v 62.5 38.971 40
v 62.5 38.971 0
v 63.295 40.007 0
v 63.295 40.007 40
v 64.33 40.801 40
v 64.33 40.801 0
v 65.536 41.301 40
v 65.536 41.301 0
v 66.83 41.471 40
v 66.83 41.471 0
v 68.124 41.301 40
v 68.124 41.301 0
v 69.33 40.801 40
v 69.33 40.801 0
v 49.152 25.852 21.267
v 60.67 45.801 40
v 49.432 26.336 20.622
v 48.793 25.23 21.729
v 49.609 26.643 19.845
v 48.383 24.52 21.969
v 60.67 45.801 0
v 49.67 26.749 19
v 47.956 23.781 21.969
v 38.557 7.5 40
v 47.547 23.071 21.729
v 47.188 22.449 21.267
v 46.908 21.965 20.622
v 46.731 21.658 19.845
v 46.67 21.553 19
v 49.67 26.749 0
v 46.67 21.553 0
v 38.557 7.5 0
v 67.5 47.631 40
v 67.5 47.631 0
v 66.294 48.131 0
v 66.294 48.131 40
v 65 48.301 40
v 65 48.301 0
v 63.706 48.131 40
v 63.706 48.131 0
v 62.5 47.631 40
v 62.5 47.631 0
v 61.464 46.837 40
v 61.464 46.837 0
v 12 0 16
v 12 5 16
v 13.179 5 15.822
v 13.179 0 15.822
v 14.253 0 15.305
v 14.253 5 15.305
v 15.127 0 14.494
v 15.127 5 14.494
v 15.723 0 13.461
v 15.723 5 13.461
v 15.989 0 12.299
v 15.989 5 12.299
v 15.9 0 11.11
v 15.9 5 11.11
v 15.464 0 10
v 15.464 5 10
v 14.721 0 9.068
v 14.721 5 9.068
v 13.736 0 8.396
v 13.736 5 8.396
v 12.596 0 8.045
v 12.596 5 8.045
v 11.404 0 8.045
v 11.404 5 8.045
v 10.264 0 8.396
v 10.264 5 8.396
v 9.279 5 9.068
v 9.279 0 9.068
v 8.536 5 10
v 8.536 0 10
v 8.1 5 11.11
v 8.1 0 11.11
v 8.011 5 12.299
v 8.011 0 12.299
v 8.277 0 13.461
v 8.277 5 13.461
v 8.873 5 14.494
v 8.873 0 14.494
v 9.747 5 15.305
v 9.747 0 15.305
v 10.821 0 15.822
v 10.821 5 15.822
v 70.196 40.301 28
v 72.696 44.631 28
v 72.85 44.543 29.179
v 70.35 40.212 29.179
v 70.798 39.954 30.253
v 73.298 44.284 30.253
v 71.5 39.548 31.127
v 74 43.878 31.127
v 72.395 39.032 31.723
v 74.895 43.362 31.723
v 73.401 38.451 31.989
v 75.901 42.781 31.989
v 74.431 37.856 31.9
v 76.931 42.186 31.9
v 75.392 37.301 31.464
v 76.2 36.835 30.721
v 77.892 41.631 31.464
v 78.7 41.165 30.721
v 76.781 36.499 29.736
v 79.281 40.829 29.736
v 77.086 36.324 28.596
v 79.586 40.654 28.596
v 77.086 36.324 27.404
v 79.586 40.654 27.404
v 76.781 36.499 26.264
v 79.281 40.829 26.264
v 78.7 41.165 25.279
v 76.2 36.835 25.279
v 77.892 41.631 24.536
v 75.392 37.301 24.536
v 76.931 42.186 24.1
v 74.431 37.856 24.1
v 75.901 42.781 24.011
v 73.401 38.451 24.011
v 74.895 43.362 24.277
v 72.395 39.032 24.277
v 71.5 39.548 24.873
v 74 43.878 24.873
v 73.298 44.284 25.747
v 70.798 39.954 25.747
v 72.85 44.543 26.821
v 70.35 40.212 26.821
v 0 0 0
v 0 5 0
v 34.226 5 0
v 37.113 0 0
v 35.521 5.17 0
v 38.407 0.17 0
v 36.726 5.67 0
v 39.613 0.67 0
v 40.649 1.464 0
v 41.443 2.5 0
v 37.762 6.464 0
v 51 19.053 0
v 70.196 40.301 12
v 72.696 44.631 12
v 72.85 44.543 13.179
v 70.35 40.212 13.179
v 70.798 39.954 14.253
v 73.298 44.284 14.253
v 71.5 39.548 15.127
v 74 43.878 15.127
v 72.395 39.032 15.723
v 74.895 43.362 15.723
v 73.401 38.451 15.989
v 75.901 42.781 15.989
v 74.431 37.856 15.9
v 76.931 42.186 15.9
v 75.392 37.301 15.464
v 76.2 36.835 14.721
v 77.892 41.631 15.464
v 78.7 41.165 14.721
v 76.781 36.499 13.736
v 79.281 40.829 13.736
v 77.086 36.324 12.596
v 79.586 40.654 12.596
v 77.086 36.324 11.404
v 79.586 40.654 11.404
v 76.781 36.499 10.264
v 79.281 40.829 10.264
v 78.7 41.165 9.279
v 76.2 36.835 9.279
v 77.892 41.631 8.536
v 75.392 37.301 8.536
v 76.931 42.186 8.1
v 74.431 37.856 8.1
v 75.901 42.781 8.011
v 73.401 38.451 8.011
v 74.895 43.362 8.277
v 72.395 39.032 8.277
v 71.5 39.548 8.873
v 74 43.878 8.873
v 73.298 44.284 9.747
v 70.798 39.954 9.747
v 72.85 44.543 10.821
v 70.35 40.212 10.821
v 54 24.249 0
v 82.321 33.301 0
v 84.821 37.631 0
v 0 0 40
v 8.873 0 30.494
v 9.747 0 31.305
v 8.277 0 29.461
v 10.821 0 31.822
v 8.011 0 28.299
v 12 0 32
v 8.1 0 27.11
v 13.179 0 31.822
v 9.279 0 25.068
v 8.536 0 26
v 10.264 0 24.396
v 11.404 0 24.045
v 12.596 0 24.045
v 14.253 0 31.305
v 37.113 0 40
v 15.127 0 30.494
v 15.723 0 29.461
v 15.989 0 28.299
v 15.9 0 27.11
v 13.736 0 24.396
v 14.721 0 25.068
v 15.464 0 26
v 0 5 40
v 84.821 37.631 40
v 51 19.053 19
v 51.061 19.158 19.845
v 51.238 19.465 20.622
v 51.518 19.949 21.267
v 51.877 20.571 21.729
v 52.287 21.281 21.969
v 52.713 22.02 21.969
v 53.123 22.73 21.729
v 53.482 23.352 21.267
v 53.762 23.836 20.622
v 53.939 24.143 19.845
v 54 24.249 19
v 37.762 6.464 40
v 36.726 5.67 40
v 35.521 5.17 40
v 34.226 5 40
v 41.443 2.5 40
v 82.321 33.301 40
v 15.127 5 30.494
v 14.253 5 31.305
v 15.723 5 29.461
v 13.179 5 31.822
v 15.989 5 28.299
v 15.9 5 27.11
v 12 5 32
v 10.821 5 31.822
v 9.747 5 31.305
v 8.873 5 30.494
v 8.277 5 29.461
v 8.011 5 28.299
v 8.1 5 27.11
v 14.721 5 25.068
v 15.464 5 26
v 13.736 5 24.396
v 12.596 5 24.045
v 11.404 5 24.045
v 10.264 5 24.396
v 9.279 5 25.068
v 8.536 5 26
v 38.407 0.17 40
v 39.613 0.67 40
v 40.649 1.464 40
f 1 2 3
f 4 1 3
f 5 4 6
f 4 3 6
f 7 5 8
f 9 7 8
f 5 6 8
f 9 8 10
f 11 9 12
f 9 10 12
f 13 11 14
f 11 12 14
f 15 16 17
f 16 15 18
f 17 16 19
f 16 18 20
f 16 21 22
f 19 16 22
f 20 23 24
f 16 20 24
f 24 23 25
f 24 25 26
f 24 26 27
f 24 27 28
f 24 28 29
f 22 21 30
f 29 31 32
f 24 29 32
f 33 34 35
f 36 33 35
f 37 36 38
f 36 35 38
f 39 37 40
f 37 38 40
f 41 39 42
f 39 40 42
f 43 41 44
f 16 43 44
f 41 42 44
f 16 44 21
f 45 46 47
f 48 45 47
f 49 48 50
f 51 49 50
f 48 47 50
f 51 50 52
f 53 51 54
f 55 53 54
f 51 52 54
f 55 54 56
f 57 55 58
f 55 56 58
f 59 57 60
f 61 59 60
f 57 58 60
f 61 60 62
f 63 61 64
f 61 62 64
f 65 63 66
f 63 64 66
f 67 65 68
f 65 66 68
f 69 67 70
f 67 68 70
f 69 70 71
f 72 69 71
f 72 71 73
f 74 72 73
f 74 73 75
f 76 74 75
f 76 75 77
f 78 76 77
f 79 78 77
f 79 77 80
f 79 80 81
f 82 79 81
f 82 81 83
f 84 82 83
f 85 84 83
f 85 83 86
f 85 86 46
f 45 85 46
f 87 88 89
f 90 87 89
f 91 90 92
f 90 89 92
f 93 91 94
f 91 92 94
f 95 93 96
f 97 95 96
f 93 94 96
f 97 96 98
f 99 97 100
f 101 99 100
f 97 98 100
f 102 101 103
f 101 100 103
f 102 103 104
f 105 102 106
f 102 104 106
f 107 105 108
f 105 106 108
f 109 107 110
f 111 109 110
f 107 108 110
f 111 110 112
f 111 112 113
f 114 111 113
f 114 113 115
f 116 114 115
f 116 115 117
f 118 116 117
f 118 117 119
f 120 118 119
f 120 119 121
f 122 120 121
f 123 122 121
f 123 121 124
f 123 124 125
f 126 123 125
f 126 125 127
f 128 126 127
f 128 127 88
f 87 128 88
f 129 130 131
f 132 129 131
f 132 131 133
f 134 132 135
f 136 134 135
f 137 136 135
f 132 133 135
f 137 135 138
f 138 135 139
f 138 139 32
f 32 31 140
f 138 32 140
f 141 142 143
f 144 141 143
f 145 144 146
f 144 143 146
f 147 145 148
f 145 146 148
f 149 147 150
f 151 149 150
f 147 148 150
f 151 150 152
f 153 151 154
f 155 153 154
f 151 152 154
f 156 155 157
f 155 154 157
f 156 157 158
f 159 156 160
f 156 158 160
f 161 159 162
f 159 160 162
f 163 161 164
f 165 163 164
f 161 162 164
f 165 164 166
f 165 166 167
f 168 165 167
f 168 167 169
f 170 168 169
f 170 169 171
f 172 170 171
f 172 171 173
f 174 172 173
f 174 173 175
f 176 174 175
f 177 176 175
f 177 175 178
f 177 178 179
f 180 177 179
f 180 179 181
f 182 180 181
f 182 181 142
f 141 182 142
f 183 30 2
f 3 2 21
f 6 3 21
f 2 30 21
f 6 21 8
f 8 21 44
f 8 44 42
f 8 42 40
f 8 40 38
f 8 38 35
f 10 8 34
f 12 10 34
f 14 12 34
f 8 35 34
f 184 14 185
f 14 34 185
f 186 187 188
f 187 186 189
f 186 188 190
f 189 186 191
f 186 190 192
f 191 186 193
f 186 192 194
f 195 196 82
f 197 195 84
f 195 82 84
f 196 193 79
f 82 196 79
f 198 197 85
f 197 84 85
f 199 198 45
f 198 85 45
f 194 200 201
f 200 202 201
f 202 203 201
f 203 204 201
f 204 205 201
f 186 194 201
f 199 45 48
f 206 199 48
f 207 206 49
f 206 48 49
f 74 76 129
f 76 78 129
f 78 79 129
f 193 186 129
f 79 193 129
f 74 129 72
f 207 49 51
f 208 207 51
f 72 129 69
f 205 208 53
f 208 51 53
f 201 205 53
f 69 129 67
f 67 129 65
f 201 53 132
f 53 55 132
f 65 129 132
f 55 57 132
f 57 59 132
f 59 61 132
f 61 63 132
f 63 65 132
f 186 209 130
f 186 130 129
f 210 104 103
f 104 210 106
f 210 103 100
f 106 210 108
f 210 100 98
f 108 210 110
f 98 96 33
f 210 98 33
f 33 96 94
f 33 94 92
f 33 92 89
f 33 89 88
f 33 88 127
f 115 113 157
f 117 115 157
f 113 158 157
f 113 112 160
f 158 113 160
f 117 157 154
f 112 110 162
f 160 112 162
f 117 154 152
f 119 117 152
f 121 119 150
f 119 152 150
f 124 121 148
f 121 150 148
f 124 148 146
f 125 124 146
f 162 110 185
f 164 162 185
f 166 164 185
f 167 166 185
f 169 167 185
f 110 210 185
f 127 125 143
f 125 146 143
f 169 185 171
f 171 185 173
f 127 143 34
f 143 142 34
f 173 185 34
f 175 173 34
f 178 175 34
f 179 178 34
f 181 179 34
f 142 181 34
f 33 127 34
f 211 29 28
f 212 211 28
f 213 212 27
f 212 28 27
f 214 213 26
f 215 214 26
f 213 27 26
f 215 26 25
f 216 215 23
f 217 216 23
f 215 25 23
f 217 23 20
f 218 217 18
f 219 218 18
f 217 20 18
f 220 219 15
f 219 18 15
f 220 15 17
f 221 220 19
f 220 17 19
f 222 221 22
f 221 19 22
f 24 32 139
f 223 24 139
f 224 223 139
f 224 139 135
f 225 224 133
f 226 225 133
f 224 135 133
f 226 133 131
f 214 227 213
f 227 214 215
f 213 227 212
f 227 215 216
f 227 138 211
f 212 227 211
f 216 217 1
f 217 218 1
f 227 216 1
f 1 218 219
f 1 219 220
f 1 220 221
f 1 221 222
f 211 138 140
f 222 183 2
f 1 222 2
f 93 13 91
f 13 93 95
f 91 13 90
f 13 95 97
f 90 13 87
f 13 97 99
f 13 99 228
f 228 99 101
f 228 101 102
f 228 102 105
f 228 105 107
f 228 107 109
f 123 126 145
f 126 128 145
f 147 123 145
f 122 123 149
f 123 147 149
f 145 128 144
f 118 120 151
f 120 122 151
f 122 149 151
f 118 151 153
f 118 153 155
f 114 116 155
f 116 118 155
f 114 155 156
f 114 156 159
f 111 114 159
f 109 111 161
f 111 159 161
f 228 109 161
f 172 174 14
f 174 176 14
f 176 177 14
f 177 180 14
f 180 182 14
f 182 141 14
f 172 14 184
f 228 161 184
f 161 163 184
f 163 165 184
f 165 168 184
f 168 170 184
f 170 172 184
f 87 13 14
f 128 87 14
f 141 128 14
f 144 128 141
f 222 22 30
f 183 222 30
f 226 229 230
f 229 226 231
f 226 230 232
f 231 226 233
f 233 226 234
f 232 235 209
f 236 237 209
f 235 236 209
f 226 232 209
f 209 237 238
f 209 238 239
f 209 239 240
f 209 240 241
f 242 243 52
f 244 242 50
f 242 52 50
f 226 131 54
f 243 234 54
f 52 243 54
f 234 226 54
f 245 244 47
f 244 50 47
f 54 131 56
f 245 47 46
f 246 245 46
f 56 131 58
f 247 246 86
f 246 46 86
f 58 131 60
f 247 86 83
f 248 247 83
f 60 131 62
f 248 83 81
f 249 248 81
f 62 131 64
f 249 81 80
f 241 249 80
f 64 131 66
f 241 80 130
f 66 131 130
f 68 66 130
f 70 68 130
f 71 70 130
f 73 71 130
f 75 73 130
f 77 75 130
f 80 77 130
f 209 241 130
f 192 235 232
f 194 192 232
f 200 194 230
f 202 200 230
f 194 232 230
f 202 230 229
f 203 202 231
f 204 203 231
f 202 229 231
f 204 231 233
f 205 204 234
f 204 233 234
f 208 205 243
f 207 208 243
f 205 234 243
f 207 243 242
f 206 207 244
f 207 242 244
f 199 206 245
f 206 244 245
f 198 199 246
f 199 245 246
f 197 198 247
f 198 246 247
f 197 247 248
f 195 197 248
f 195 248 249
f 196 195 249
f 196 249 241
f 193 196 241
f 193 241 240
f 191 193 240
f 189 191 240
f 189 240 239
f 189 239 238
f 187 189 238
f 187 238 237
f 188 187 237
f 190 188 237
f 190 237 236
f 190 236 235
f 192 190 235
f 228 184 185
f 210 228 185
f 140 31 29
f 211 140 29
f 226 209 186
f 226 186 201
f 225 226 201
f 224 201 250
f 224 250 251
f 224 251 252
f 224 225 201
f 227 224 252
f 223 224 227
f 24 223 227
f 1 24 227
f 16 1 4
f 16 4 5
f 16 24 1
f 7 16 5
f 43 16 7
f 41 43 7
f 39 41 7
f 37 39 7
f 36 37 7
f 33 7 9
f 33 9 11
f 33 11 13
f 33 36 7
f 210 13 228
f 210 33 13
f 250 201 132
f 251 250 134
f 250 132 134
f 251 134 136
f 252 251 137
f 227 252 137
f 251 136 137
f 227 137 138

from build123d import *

# Parameters (mm, degrees)
BOSS_EXTRUDE1_DEPTH = 40
SKETCH2_R           = 4
CUT_EXTRUDE1_DEPTH  = 40
CUT_EXTRUDE2_REACH  = 97.306
CUT_EXTRUDE3_REACH  = 91.766
SKETCH4_R           = 4


with BuildPart() as part:
    # Sketch1 → Boss-Extrude1 (new body)
    with BuildSketch(Plane.XY):
        with BuildLine():
            Line((0, 5), (0, 0))
            Line((0, 0), (37.113248654, 0))
            ThreePointArc((37.113248654, 0), (39.613248654, 0.669872981), (41.443375673, 2.5))
            Line((41.443375673, 2.5), (62.5, 38.97114317))
            ThreePointArc((62.5, 38.97114317), (65.536031793, 41.300772302), (69.330127019, 40.801270189))
            Line((69.330127019, 40.801270189), (82.320508076, 33.301270189))
            Line((82.320508076, 33.301270189), (84.820508076, 37.631397208))
            Line((84.820508076, 37.631397208), (67.5, 47.631397208))
            ThreePointArc((67.5, 47.631397208), (63.705904774, 48.130899321), (60.669872981, 45.801270189))
            Line((60.669872981, 45.801270189), (38.556624327, 7.5))
            ThreePointArc((38.556624327, 7.5), (36.726497308, 5.669872981), (34.226497308, 5))
            Line((34.226497308, 5), (0, 5))
        make_face()
    extrude(amount=BOSS_EXTRUDE1_DEPTH)

    # Sketch2 → Cut-Extrude1 (cut)
    with BuildSketch(Plane(origin=(0, 5, 0), x_dir=(1, 0, 0), z_dir=(0, 1, 0))):
        with Locations(Location((12, -12, 0), (0, 0, 270))):
            Circle(SKETCH2_R)
        with Locations(Location((12, -28, 0), (0, 0, 270))):
            Circle(SKETCH2_R)
    extrude(amount=-CUT_EXTRUDE1_DEPTH, mode=Mode.SUBTRACT)

    # Sketch3 → Cut-Extrude2 (cut, up to next)
    with BuildSketch(Plane(origin=(25.669872981, -14.820508076, 0), x_dir=(0, 0, 1), z_dir=(-0.86602540378444, 0.49999999999999784, 0)), mode=Mode.PRIVATE) as cut_extrude2_sk1:
        with BuildLine():
            Line((19, 48), (0, 48))
            Line((0, 48), (0, 42))
            Line((0, 42), (19, 42))
            ThreePointArc((19, 42), (22, 45), (19, 48))
        make_face()
    cut_extrude2_tool1 = extrude(cut_extrude2_sk1.sketch, amount=-CUT_EXTRUDE2_REACH, mode=Mode.PRIVATE) & part.part
    add(cut_extrude2_tool1.solids().sort_by_distance((48.169873, 24.150635, 10.688594))[0], mode=Mode.SUBTRACT)

    # Sketch4 → Cut-Extrude3 (cut, up to next)
    with BuildSketch(Plane(origin=(37.5, 64.951905284, 0), x_dir=(0.8660254037844429, -0.49999999999999284, 0), z_dir=(0.49999999999999284, 0.8660254037844429, 0)), mode=Mode.PRIVATE) as cut_extrude3_sk1:
        with Locations(Location((44.641016151, -28, 0), (0, 0, 180))):
            Circle(SKETCH4_R)
    cut_extrude3_tool1 = extrude(cut_extrude3_sk1.sketch, amount=-CUT_EXTRUDE3_REACH, mode=Mode.PRIVATE) & part.part
    # Sketch4 → Cut-Extrude3 (cut, up to next)
    with BuildSketch(Plane(origin=(37.5, 64.951905284, 0), x_dir=(0.8660254037844429, -0.49999999999999284, 0), z_dir=(0.49999999999999284, 0.8660254037844429, 0)), mode=Mode.PRIVATE) as cut_extrude3_sk2:
        with Locations(Location((44.641016151, -12, 0), (0, 0, 180))):
            Circle(SKETCH4_R)
    cut_extrude3_tool2 = extrude(cut_extrude3_sk2.sketch, amount=-CUT_EXTRUDE3_REACH, mode=Mode.PRIVATE) & part.part
    add(cut_extrude3_tool1.solids().sort_by_distance((76.160254, 42.631397, 28))[0], mode=Mode.SUBTRACT)
    add(cut_extrude3_tool2.solids().sort_by_distance((76.160254, 42.631397, 12))[0], mode=Mode.SUBTRACT)


solid = part.part
